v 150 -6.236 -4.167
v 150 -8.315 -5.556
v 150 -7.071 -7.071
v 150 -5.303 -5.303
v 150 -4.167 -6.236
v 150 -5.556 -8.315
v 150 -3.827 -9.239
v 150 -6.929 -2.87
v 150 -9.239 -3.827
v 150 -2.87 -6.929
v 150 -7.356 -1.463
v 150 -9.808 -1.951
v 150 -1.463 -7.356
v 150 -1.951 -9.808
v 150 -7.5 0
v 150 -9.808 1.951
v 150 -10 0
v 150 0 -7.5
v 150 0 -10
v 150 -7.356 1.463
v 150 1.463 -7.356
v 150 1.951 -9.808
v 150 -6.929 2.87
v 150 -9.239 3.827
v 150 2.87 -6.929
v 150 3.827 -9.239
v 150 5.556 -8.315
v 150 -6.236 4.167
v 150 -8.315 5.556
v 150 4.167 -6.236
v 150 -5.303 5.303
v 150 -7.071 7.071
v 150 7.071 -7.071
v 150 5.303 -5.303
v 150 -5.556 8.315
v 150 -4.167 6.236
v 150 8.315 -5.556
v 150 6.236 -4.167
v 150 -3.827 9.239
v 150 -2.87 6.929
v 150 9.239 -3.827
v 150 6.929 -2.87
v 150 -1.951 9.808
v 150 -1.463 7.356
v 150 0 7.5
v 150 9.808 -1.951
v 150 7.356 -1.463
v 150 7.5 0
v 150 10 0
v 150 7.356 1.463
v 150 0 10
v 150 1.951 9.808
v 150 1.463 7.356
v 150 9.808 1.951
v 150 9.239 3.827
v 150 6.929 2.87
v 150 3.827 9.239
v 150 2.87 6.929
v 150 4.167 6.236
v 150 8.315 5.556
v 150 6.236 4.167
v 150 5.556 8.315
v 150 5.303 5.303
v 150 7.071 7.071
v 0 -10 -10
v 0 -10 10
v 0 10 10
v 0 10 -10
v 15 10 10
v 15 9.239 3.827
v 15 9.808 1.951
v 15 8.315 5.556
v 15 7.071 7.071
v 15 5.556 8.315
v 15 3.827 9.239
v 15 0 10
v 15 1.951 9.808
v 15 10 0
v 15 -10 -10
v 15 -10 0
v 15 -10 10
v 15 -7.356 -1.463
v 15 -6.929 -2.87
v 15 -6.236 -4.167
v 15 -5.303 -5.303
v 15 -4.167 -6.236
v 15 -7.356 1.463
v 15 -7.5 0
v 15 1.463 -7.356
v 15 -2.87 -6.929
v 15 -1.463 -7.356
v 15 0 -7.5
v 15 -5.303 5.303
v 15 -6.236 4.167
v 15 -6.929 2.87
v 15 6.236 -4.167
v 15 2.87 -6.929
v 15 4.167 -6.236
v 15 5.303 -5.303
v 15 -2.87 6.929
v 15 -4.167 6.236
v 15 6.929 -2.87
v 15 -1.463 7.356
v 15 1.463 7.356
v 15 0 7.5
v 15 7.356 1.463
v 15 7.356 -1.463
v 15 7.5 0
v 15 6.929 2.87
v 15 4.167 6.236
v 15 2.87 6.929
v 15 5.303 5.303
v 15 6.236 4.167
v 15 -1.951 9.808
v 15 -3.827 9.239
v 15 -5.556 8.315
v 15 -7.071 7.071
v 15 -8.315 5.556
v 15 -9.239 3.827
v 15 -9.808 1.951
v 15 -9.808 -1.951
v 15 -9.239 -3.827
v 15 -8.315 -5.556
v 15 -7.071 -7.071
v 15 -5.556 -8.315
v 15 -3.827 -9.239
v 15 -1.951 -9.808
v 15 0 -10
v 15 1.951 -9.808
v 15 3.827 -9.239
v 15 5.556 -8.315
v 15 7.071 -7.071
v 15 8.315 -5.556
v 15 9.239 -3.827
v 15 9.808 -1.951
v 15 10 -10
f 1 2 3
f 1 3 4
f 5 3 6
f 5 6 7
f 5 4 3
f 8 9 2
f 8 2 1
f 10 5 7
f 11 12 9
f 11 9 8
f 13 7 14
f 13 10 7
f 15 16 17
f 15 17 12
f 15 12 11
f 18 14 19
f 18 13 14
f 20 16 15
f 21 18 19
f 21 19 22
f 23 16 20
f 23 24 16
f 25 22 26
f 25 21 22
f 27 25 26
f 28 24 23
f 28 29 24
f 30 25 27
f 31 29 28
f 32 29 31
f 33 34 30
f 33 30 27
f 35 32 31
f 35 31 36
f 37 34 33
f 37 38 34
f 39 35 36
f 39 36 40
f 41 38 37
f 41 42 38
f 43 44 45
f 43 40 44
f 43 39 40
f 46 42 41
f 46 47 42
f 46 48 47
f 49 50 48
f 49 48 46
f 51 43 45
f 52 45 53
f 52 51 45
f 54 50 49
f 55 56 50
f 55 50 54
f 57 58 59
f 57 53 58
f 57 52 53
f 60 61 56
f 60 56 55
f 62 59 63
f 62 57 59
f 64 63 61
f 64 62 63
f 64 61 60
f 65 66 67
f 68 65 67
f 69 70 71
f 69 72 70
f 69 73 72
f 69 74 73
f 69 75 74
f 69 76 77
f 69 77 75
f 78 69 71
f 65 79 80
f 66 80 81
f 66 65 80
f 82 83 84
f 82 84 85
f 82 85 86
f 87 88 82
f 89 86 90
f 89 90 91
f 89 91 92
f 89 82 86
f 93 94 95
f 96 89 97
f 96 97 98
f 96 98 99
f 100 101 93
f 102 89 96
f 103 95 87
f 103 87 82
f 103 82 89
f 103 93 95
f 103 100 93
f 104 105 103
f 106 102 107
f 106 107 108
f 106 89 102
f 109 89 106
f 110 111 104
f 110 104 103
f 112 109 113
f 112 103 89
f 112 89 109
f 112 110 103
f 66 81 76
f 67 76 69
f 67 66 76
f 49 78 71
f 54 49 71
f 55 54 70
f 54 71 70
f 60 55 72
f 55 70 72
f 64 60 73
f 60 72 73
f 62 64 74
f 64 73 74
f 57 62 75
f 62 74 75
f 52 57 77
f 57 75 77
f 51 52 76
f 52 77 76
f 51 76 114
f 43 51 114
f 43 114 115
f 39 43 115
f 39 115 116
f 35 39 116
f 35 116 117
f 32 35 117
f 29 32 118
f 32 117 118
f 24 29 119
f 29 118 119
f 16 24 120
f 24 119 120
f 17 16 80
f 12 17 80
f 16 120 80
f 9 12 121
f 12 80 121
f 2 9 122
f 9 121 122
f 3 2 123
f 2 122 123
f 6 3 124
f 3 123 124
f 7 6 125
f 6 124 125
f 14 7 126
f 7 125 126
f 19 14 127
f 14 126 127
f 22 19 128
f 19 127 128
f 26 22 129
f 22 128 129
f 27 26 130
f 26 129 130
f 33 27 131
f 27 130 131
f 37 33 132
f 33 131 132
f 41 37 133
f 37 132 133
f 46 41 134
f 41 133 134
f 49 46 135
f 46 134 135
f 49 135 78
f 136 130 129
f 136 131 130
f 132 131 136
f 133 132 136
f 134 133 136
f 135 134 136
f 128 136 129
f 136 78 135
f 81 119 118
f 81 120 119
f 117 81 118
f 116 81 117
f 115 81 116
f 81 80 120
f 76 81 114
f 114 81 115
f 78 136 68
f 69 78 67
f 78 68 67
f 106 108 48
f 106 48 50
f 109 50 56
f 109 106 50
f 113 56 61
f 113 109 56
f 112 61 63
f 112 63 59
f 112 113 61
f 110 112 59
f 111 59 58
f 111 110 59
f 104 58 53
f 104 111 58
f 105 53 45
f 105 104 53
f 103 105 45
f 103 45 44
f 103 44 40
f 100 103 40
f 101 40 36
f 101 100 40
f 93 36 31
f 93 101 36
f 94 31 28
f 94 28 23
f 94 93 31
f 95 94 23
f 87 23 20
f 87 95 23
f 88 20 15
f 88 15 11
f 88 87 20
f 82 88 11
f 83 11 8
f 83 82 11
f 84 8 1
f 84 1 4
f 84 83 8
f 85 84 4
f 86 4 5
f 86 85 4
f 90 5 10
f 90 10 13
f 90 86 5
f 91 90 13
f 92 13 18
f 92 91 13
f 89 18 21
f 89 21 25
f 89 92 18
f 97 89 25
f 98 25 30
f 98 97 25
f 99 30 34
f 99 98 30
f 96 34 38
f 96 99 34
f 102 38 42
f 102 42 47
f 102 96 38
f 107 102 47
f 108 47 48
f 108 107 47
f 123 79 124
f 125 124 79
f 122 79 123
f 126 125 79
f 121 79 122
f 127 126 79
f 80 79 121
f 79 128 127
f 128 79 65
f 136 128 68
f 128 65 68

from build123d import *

# Parameters (mm, degrees)
F0_W     = 20
F0_H     = 20
F1_DEPTH = 15
F2_R     = 10
F2_R_2   = 7.5
F3_DEPTH = 135


with BuildPart() as f1:
    # F0 (on Right) → F1 (new body)
    with BuildSketch(Plane.YZ):
        Rectangle(F0_W, F0_H)
    extrude(amount=F1_DEPTH)

    # F2 (on face) → F3 (join)
    with BuildSketch(Plane.YZ.offset(15)):
        Circle(F2_R)
        Circle(F2_R_2, mode=Mode.SUBTRACT)
    extrude(amount=F3_DEPTH)


solid = f1.part
